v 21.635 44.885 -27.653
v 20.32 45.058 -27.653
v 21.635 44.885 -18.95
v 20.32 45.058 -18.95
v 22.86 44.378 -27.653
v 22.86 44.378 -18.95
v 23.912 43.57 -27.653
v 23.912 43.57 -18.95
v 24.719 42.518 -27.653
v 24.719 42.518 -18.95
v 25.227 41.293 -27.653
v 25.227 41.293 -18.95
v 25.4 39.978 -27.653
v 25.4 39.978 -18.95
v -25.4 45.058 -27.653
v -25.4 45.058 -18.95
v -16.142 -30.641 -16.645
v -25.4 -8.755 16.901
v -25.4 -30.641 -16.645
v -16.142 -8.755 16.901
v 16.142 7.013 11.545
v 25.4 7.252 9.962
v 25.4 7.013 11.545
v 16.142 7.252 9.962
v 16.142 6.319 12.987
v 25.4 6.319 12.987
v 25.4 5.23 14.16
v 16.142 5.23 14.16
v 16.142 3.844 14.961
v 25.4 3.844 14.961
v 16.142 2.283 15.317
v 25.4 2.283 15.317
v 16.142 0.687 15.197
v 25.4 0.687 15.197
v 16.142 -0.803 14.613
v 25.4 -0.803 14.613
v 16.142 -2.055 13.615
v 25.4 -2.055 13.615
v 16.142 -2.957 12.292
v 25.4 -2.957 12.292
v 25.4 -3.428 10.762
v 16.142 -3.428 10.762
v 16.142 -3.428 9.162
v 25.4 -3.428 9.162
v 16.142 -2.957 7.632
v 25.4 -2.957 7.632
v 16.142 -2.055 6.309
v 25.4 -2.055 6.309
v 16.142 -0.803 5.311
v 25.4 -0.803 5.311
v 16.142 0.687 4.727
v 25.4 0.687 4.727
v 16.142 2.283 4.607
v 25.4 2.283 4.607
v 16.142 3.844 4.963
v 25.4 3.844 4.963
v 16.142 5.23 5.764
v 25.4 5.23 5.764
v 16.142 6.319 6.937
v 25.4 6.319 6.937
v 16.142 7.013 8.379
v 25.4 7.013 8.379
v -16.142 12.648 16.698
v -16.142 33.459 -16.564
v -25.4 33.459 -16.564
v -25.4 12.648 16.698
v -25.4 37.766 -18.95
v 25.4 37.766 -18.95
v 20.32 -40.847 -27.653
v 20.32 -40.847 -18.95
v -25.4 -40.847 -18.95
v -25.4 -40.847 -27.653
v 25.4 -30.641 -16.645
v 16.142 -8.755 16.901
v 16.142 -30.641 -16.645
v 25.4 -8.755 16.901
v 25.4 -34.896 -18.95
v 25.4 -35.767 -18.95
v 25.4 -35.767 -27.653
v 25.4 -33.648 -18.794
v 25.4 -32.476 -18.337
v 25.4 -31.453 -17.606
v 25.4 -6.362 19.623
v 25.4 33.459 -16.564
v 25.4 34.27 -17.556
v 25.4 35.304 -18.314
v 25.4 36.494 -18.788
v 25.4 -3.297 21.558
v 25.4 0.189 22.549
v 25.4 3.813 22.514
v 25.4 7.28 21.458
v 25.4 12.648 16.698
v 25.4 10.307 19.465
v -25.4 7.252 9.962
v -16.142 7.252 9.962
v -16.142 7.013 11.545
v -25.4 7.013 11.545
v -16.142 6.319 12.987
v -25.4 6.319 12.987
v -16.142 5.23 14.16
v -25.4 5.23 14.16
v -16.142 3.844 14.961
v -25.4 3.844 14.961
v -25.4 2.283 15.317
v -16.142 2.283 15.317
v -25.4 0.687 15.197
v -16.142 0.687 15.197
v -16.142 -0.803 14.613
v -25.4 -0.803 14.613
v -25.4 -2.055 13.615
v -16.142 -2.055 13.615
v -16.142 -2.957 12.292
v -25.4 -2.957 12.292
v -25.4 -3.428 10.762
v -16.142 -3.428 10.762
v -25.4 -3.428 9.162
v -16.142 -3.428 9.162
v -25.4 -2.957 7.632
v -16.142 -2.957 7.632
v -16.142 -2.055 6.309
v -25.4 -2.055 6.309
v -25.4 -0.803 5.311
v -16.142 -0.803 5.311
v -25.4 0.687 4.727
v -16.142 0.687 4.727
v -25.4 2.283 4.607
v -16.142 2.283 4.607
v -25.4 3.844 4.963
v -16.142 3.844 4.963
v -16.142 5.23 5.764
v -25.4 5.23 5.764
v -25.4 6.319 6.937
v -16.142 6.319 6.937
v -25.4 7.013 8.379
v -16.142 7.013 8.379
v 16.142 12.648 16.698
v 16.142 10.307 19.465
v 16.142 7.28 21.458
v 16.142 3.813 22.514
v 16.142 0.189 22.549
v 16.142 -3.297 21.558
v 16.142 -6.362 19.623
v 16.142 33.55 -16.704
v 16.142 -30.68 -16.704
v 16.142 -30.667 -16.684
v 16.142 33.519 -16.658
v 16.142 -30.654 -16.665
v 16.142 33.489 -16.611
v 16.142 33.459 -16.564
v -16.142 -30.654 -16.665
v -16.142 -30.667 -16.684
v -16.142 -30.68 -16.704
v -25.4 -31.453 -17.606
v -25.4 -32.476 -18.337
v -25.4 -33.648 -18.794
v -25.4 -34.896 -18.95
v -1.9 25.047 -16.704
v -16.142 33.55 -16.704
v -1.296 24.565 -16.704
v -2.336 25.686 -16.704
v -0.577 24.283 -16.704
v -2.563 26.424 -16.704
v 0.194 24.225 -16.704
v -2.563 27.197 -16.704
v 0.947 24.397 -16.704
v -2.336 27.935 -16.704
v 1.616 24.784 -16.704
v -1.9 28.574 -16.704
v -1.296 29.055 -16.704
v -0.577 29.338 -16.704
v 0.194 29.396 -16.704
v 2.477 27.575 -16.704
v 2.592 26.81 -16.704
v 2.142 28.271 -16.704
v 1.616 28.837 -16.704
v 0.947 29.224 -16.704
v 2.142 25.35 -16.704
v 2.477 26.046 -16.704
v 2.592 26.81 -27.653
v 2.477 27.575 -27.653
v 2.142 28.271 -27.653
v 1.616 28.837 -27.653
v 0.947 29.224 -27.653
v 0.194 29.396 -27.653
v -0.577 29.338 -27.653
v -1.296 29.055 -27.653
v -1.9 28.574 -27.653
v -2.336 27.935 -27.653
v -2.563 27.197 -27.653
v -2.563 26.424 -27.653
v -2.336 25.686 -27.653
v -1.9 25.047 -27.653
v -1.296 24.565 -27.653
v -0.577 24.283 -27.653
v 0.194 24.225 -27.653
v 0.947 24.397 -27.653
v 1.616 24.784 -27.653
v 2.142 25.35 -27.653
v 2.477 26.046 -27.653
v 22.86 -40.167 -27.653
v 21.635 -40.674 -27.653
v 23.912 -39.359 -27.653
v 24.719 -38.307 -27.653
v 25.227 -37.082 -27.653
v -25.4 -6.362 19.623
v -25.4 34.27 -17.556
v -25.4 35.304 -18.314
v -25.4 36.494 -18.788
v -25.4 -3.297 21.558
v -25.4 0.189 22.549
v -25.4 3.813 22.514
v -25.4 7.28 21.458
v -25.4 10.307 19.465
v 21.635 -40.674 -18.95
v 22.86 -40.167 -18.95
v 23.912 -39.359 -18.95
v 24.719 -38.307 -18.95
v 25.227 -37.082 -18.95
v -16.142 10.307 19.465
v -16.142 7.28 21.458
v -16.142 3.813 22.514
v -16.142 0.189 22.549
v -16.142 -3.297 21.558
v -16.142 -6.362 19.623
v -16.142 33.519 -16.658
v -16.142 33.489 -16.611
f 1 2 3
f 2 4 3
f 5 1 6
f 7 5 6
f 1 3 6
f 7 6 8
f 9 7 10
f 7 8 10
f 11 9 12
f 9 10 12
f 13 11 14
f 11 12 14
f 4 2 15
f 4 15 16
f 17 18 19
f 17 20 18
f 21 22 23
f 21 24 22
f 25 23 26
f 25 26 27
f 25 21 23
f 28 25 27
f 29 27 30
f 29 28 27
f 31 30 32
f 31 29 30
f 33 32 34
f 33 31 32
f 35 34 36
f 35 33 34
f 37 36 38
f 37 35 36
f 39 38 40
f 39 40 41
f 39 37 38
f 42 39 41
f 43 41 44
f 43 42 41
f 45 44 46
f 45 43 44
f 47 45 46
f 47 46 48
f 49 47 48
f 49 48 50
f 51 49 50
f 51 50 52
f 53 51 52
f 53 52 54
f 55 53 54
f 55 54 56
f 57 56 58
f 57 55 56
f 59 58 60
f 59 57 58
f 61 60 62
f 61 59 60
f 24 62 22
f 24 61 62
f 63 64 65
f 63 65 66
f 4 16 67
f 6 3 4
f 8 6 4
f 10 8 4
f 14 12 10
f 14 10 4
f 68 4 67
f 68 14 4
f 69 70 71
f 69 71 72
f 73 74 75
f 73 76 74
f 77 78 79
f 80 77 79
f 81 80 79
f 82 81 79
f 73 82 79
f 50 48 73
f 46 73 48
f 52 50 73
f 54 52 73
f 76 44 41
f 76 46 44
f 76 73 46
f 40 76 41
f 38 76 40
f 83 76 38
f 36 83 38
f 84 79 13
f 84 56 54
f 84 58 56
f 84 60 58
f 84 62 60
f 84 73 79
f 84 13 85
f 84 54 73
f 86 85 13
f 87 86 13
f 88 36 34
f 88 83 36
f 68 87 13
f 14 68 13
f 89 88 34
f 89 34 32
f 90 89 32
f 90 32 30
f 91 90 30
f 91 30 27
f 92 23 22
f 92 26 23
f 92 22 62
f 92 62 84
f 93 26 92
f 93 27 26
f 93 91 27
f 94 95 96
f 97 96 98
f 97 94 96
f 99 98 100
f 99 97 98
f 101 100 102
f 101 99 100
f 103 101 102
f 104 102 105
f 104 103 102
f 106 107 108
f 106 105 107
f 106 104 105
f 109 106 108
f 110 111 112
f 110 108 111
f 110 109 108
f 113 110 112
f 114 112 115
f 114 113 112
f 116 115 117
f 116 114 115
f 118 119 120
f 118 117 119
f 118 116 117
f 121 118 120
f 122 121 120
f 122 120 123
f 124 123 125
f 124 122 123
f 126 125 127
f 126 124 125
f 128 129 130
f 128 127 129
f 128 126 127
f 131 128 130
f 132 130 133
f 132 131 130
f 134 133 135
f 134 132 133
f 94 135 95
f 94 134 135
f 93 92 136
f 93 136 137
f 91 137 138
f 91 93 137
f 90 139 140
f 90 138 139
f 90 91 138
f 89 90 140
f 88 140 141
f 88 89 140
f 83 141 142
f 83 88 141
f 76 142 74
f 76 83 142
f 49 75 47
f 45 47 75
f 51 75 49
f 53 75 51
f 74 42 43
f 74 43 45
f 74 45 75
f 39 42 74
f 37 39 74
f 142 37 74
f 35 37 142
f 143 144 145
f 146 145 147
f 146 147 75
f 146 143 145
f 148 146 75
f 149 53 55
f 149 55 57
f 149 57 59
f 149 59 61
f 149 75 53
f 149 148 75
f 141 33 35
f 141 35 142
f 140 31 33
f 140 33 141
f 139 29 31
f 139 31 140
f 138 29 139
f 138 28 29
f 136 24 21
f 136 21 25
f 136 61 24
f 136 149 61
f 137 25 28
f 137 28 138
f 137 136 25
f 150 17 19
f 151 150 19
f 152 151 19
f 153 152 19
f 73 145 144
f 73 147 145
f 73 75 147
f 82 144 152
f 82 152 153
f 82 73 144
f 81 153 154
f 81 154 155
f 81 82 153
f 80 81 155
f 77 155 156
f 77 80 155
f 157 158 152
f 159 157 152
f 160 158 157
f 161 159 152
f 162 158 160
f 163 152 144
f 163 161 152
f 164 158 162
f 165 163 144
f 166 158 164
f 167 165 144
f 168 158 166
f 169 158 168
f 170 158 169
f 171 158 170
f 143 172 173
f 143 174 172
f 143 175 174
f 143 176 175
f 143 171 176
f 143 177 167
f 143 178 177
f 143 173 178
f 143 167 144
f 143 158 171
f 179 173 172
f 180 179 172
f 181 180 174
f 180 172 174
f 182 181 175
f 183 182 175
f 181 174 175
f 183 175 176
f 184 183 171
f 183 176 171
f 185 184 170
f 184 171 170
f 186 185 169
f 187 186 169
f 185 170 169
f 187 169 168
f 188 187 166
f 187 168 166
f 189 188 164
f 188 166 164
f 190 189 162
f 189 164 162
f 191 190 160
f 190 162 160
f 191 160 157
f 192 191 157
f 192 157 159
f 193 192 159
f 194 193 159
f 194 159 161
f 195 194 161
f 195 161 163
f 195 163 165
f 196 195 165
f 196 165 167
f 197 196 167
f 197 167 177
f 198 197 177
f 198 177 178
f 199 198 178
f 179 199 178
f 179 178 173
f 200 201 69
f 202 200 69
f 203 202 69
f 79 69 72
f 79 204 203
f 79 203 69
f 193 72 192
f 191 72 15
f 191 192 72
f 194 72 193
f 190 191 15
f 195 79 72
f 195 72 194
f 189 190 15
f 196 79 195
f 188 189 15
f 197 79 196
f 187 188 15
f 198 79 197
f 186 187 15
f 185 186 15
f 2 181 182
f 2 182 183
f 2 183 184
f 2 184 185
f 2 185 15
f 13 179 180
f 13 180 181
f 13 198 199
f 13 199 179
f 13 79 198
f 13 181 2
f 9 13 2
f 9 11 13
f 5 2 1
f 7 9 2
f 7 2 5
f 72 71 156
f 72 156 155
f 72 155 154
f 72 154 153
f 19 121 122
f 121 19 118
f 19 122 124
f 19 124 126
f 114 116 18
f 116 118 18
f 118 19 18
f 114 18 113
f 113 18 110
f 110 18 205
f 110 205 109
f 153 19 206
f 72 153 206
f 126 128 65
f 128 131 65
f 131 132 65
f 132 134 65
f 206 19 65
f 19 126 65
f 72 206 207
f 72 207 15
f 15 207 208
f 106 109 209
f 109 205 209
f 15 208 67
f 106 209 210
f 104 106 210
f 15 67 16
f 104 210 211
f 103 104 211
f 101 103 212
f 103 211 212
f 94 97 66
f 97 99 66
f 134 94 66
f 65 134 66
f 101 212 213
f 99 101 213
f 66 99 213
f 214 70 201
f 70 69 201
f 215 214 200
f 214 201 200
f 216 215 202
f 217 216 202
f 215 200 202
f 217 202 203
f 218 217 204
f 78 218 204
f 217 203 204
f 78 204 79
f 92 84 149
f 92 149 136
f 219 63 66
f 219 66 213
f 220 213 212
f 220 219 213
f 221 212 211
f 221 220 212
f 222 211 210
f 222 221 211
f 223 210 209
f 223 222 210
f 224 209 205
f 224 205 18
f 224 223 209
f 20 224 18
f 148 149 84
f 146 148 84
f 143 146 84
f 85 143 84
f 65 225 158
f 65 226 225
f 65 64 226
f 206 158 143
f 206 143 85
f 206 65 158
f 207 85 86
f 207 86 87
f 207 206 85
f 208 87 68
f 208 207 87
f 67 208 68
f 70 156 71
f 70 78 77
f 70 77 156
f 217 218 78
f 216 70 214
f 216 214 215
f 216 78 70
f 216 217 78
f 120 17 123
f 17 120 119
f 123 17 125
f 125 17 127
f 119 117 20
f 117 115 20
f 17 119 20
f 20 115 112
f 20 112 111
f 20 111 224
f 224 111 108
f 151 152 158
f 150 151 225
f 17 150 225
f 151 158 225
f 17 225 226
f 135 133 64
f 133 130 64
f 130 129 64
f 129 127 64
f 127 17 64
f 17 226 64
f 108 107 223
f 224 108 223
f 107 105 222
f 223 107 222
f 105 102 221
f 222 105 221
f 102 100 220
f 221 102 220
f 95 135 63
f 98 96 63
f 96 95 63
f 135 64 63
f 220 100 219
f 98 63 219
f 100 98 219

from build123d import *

# Parameters (mm, degrees)
F0_R          = 5.370035
F1_DEPTH      = 25.4
F2_R          = 5.08
F3_W          = 32.284736
F3_H          = 39.864631
F4_DEPTH      = 40.848212
F4_DEPTH_BACK = 50.8
F5_R          = 2.592442
F6_DEPTH      = 27.65358


with BuildPart() as f1:
    # F0 (on Right) → F1 (new body, symmetric)
    with BuildSketch(Plane.YZ):
        with BuildLine():
            Line((-8.754894, 16.901342), (-32.144371, -18.949738))
            Line((-32.144371, -18.949738), (34.951739, -18.949738))
            Line((34.951739, -18.949738), (12.647971, 16.698166))
            ThreePointArc((12.647971, 16.698166), (2.002183, 22.661433), (-8.754894, 16.901342))
        make_face()
        with Locations((1.881628, 9.962005)):
            Circle(F0_R, mode=Mode.SUBTRACT)
        Polygon((-32.144371, -18.949738), (-40.847212, -18.949738), (-40.847212, -27.65258), (45.05827, -27.65258), (45.05827, -18.949738), (34.951739, -18.949738), align=None)
    extrude(amount=F1_DEPTH, both=True)

    # F2
    f2_edges = [f1.edges().sort_by_distance(p)[0] for p in [
        (25.4, -40.847212, -23.301159),
        (25.4, 45.05827, -23.301159),
        (0, -32.144371, -18.949738),
        (0, 34.951739, -18.949738),
    ]]
    fillet(f2_edges, radius=F2_R)

    # F3 (on Front) → F4 (cut, two sides)
    with BuildSketch(Plane.XZ) as f4_sk:
        with Locations((0, 3.228473)):
            Rectangle(F3_W, F3_H)
    extrude(amount=F4_DEPTH, mode=Mode.SUBTRACT)
    extrude(f4_sk.sketch, amount=-F4_DEPTH_BACK, mode=Mode.SUBTRACT)

    # F5 (on Top) → F6 (cut, through all)
    with BuildSketch(Plane.XY):
        with Locations((0, 26.810369)):
            Circle(F5_R)
    extrude(amount=-F6_DEPTH, mode=Mode.SUBTRACT)


solid = f1.part
